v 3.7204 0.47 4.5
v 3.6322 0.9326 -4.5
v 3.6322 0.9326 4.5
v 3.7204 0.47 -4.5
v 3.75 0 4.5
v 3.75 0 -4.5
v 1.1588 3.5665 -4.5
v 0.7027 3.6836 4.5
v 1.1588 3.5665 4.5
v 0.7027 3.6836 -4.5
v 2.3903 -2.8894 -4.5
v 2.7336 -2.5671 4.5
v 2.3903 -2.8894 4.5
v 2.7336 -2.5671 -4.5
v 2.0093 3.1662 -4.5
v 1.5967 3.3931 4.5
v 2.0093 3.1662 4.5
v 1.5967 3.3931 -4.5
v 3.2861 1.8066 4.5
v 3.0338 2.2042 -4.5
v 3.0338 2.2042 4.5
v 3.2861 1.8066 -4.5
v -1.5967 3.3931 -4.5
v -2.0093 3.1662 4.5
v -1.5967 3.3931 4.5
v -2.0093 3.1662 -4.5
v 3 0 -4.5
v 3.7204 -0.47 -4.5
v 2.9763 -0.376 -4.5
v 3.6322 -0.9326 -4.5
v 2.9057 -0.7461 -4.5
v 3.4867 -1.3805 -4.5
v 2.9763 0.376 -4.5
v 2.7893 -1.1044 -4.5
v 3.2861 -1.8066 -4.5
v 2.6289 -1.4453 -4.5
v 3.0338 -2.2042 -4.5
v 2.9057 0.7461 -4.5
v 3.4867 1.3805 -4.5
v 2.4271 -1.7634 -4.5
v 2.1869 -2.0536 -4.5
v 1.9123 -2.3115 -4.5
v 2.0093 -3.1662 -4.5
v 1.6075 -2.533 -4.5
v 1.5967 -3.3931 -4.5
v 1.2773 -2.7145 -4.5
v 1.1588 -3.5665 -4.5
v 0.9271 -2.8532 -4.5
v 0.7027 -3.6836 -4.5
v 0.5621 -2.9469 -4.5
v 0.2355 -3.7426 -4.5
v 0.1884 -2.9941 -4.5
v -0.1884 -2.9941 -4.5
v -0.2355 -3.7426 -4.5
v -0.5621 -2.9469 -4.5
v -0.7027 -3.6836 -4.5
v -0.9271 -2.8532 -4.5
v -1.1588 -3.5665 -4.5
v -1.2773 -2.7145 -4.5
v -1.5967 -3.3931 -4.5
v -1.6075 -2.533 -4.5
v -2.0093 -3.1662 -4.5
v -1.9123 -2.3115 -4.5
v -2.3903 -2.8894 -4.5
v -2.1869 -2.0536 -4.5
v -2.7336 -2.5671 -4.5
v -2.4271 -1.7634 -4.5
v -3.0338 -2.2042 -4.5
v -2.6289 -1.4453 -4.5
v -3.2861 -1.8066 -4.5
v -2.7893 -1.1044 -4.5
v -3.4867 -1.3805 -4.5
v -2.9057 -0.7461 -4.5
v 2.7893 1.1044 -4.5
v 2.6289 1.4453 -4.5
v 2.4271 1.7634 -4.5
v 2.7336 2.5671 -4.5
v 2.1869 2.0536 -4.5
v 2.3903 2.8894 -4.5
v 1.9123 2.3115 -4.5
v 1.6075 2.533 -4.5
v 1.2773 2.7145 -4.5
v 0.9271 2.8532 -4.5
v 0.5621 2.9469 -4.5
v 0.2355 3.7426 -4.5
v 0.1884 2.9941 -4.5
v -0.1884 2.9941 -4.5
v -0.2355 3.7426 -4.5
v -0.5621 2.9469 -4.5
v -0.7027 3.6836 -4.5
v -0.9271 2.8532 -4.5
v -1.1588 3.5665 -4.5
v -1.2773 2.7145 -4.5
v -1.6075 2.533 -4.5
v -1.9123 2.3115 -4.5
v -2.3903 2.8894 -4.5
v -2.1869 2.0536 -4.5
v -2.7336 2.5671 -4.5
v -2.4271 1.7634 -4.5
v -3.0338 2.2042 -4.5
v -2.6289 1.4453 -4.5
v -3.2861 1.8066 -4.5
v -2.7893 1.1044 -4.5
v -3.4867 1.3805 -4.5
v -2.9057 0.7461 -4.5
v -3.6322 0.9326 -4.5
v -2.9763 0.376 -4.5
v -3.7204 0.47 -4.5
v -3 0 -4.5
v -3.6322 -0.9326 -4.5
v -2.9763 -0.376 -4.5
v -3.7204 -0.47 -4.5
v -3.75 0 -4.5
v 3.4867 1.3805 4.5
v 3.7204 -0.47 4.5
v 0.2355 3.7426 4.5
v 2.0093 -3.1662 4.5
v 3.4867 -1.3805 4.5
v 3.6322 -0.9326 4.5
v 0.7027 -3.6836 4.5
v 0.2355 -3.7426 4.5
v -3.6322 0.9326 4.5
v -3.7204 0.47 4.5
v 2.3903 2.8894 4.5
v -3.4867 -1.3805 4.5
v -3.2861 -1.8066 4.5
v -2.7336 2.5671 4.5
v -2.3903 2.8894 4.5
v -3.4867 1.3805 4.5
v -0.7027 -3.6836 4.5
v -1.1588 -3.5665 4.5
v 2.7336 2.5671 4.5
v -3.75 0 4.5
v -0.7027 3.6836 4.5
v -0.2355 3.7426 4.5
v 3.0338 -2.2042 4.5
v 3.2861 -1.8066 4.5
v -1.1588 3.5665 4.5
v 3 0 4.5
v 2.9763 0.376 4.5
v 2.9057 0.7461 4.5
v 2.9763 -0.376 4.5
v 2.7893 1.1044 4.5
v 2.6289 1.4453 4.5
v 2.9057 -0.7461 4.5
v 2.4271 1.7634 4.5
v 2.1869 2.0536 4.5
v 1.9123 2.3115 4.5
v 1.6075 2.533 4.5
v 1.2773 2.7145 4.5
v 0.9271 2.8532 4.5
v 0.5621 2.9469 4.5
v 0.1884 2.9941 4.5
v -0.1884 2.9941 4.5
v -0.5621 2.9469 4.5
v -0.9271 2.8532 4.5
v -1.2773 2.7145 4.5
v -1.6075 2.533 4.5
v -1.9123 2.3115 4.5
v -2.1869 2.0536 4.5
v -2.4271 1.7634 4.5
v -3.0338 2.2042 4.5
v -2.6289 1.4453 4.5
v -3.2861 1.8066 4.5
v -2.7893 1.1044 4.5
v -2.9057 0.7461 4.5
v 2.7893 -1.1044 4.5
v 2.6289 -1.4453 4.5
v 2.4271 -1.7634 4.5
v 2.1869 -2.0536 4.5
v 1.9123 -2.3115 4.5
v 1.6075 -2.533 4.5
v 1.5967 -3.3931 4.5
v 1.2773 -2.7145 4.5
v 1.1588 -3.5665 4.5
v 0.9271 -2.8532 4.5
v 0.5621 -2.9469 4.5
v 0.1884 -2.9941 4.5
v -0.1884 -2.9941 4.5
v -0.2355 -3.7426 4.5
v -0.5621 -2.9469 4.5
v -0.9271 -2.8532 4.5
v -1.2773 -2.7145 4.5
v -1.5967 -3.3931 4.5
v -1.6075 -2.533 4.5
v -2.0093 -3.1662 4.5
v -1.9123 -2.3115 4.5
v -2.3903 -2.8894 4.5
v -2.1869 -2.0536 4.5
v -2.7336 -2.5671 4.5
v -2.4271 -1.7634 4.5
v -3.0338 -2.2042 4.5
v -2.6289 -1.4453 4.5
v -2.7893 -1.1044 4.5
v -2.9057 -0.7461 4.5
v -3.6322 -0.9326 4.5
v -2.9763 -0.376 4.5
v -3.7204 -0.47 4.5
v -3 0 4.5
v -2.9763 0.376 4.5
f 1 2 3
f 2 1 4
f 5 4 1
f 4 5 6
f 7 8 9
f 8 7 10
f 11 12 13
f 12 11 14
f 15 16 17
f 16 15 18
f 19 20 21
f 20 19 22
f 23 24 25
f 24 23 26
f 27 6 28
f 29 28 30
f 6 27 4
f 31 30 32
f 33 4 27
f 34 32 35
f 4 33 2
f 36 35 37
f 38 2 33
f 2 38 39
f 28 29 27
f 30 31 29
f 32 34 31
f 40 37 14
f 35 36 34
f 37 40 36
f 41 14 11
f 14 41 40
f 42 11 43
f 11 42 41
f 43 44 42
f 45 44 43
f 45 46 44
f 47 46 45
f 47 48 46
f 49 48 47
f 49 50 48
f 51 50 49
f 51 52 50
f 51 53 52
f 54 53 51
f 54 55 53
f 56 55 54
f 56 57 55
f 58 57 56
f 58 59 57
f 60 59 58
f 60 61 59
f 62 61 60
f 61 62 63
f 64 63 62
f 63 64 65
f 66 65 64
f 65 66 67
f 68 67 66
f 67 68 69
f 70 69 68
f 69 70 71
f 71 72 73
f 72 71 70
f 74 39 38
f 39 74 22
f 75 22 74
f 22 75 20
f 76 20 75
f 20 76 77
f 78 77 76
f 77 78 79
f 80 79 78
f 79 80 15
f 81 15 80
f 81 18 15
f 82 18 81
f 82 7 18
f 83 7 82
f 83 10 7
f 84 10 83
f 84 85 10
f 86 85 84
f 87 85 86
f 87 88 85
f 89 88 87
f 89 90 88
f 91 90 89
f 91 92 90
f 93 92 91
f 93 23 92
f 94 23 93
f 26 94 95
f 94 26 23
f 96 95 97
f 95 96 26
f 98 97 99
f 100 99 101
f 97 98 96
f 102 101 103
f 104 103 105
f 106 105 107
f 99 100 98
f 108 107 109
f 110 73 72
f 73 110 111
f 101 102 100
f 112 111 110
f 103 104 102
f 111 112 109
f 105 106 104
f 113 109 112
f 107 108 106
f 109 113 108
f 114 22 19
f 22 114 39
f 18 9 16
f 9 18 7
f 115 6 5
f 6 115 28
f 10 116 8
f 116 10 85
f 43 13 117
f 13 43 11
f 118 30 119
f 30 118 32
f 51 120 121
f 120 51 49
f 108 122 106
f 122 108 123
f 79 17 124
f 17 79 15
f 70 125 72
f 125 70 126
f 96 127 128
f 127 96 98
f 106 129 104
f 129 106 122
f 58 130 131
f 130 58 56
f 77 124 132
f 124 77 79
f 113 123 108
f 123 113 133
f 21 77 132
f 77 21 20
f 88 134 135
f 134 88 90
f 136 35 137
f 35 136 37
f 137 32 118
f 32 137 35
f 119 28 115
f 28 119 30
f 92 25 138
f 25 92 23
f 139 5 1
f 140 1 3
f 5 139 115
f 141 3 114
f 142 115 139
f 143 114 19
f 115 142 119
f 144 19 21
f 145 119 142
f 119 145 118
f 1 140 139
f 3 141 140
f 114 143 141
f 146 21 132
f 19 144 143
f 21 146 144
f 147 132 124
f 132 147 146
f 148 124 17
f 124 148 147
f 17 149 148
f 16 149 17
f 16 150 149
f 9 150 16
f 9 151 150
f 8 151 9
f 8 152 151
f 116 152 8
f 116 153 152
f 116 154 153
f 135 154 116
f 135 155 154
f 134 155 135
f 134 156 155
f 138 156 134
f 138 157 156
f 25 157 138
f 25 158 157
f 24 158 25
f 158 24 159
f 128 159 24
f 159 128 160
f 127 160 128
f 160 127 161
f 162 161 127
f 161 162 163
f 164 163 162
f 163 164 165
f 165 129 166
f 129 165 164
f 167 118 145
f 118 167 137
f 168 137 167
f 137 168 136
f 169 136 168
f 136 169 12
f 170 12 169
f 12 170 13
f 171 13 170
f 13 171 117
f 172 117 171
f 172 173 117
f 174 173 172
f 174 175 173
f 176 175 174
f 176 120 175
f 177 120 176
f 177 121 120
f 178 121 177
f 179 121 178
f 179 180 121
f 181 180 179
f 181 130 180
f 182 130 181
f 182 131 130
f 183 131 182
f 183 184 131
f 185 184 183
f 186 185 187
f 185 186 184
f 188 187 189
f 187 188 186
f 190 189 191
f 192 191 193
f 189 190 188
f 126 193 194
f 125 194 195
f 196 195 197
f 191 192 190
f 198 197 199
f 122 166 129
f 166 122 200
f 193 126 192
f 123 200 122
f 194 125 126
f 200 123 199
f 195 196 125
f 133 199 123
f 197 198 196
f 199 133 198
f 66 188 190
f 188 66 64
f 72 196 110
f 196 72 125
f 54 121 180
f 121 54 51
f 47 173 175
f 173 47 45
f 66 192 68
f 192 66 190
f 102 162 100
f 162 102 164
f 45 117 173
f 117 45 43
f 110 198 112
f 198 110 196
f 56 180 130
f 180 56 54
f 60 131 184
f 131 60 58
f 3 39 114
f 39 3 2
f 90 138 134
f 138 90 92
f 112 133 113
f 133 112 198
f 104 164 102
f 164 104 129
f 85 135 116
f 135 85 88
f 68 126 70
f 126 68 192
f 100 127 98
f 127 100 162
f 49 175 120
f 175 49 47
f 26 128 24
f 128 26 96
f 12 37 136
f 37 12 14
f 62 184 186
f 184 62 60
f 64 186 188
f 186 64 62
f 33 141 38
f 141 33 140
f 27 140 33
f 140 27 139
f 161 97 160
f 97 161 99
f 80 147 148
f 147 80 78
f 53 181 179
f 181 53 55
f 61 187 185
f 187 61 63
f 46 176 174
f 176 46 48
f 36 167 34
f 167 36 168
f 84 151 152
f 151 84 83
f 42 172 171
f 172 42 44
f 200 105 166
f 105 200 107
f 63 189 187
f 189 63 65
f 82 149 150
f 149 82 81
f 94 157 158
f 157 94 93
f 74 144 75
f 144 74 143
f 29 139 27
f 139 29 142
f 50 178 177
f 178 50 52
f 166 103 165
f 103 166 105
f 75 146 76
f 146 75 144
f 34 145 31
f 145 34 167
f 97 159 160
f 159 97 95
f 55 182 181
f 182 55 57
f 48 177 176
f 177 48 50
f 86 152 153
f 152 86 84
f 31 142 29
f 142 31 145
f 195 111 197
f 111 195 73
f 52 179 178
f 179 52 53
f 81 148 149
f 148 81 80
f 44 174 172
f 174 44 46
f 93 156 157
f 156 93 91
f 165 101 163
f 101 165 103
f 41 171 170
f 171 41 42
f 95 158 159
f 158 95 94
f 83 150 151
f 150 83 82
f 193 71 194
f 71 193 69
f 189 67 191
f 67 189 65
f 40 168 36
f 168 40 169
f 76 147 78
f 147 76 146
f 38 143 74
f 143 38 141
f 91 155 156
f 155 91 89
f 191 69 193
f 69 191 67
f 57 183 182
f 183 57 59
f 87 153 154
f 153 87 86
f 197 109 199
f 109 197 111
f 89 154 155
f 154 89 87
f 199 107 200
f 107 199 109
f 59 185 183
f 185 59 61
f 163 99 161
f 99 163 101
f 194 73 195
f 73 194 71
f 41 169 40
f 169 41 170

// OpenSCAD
$fn = 50;


difference() {
	union() {
		translate(v = [0, 0, -4.5000000000]) {
			cylinder(h = 9, r = 3.7500000000);
		}
	}
	union() {
		translate(v = [0, 0, -100.0000000000]) {
			cylinder(h = 200, r = 3.0000000000);
		}
	}
}
